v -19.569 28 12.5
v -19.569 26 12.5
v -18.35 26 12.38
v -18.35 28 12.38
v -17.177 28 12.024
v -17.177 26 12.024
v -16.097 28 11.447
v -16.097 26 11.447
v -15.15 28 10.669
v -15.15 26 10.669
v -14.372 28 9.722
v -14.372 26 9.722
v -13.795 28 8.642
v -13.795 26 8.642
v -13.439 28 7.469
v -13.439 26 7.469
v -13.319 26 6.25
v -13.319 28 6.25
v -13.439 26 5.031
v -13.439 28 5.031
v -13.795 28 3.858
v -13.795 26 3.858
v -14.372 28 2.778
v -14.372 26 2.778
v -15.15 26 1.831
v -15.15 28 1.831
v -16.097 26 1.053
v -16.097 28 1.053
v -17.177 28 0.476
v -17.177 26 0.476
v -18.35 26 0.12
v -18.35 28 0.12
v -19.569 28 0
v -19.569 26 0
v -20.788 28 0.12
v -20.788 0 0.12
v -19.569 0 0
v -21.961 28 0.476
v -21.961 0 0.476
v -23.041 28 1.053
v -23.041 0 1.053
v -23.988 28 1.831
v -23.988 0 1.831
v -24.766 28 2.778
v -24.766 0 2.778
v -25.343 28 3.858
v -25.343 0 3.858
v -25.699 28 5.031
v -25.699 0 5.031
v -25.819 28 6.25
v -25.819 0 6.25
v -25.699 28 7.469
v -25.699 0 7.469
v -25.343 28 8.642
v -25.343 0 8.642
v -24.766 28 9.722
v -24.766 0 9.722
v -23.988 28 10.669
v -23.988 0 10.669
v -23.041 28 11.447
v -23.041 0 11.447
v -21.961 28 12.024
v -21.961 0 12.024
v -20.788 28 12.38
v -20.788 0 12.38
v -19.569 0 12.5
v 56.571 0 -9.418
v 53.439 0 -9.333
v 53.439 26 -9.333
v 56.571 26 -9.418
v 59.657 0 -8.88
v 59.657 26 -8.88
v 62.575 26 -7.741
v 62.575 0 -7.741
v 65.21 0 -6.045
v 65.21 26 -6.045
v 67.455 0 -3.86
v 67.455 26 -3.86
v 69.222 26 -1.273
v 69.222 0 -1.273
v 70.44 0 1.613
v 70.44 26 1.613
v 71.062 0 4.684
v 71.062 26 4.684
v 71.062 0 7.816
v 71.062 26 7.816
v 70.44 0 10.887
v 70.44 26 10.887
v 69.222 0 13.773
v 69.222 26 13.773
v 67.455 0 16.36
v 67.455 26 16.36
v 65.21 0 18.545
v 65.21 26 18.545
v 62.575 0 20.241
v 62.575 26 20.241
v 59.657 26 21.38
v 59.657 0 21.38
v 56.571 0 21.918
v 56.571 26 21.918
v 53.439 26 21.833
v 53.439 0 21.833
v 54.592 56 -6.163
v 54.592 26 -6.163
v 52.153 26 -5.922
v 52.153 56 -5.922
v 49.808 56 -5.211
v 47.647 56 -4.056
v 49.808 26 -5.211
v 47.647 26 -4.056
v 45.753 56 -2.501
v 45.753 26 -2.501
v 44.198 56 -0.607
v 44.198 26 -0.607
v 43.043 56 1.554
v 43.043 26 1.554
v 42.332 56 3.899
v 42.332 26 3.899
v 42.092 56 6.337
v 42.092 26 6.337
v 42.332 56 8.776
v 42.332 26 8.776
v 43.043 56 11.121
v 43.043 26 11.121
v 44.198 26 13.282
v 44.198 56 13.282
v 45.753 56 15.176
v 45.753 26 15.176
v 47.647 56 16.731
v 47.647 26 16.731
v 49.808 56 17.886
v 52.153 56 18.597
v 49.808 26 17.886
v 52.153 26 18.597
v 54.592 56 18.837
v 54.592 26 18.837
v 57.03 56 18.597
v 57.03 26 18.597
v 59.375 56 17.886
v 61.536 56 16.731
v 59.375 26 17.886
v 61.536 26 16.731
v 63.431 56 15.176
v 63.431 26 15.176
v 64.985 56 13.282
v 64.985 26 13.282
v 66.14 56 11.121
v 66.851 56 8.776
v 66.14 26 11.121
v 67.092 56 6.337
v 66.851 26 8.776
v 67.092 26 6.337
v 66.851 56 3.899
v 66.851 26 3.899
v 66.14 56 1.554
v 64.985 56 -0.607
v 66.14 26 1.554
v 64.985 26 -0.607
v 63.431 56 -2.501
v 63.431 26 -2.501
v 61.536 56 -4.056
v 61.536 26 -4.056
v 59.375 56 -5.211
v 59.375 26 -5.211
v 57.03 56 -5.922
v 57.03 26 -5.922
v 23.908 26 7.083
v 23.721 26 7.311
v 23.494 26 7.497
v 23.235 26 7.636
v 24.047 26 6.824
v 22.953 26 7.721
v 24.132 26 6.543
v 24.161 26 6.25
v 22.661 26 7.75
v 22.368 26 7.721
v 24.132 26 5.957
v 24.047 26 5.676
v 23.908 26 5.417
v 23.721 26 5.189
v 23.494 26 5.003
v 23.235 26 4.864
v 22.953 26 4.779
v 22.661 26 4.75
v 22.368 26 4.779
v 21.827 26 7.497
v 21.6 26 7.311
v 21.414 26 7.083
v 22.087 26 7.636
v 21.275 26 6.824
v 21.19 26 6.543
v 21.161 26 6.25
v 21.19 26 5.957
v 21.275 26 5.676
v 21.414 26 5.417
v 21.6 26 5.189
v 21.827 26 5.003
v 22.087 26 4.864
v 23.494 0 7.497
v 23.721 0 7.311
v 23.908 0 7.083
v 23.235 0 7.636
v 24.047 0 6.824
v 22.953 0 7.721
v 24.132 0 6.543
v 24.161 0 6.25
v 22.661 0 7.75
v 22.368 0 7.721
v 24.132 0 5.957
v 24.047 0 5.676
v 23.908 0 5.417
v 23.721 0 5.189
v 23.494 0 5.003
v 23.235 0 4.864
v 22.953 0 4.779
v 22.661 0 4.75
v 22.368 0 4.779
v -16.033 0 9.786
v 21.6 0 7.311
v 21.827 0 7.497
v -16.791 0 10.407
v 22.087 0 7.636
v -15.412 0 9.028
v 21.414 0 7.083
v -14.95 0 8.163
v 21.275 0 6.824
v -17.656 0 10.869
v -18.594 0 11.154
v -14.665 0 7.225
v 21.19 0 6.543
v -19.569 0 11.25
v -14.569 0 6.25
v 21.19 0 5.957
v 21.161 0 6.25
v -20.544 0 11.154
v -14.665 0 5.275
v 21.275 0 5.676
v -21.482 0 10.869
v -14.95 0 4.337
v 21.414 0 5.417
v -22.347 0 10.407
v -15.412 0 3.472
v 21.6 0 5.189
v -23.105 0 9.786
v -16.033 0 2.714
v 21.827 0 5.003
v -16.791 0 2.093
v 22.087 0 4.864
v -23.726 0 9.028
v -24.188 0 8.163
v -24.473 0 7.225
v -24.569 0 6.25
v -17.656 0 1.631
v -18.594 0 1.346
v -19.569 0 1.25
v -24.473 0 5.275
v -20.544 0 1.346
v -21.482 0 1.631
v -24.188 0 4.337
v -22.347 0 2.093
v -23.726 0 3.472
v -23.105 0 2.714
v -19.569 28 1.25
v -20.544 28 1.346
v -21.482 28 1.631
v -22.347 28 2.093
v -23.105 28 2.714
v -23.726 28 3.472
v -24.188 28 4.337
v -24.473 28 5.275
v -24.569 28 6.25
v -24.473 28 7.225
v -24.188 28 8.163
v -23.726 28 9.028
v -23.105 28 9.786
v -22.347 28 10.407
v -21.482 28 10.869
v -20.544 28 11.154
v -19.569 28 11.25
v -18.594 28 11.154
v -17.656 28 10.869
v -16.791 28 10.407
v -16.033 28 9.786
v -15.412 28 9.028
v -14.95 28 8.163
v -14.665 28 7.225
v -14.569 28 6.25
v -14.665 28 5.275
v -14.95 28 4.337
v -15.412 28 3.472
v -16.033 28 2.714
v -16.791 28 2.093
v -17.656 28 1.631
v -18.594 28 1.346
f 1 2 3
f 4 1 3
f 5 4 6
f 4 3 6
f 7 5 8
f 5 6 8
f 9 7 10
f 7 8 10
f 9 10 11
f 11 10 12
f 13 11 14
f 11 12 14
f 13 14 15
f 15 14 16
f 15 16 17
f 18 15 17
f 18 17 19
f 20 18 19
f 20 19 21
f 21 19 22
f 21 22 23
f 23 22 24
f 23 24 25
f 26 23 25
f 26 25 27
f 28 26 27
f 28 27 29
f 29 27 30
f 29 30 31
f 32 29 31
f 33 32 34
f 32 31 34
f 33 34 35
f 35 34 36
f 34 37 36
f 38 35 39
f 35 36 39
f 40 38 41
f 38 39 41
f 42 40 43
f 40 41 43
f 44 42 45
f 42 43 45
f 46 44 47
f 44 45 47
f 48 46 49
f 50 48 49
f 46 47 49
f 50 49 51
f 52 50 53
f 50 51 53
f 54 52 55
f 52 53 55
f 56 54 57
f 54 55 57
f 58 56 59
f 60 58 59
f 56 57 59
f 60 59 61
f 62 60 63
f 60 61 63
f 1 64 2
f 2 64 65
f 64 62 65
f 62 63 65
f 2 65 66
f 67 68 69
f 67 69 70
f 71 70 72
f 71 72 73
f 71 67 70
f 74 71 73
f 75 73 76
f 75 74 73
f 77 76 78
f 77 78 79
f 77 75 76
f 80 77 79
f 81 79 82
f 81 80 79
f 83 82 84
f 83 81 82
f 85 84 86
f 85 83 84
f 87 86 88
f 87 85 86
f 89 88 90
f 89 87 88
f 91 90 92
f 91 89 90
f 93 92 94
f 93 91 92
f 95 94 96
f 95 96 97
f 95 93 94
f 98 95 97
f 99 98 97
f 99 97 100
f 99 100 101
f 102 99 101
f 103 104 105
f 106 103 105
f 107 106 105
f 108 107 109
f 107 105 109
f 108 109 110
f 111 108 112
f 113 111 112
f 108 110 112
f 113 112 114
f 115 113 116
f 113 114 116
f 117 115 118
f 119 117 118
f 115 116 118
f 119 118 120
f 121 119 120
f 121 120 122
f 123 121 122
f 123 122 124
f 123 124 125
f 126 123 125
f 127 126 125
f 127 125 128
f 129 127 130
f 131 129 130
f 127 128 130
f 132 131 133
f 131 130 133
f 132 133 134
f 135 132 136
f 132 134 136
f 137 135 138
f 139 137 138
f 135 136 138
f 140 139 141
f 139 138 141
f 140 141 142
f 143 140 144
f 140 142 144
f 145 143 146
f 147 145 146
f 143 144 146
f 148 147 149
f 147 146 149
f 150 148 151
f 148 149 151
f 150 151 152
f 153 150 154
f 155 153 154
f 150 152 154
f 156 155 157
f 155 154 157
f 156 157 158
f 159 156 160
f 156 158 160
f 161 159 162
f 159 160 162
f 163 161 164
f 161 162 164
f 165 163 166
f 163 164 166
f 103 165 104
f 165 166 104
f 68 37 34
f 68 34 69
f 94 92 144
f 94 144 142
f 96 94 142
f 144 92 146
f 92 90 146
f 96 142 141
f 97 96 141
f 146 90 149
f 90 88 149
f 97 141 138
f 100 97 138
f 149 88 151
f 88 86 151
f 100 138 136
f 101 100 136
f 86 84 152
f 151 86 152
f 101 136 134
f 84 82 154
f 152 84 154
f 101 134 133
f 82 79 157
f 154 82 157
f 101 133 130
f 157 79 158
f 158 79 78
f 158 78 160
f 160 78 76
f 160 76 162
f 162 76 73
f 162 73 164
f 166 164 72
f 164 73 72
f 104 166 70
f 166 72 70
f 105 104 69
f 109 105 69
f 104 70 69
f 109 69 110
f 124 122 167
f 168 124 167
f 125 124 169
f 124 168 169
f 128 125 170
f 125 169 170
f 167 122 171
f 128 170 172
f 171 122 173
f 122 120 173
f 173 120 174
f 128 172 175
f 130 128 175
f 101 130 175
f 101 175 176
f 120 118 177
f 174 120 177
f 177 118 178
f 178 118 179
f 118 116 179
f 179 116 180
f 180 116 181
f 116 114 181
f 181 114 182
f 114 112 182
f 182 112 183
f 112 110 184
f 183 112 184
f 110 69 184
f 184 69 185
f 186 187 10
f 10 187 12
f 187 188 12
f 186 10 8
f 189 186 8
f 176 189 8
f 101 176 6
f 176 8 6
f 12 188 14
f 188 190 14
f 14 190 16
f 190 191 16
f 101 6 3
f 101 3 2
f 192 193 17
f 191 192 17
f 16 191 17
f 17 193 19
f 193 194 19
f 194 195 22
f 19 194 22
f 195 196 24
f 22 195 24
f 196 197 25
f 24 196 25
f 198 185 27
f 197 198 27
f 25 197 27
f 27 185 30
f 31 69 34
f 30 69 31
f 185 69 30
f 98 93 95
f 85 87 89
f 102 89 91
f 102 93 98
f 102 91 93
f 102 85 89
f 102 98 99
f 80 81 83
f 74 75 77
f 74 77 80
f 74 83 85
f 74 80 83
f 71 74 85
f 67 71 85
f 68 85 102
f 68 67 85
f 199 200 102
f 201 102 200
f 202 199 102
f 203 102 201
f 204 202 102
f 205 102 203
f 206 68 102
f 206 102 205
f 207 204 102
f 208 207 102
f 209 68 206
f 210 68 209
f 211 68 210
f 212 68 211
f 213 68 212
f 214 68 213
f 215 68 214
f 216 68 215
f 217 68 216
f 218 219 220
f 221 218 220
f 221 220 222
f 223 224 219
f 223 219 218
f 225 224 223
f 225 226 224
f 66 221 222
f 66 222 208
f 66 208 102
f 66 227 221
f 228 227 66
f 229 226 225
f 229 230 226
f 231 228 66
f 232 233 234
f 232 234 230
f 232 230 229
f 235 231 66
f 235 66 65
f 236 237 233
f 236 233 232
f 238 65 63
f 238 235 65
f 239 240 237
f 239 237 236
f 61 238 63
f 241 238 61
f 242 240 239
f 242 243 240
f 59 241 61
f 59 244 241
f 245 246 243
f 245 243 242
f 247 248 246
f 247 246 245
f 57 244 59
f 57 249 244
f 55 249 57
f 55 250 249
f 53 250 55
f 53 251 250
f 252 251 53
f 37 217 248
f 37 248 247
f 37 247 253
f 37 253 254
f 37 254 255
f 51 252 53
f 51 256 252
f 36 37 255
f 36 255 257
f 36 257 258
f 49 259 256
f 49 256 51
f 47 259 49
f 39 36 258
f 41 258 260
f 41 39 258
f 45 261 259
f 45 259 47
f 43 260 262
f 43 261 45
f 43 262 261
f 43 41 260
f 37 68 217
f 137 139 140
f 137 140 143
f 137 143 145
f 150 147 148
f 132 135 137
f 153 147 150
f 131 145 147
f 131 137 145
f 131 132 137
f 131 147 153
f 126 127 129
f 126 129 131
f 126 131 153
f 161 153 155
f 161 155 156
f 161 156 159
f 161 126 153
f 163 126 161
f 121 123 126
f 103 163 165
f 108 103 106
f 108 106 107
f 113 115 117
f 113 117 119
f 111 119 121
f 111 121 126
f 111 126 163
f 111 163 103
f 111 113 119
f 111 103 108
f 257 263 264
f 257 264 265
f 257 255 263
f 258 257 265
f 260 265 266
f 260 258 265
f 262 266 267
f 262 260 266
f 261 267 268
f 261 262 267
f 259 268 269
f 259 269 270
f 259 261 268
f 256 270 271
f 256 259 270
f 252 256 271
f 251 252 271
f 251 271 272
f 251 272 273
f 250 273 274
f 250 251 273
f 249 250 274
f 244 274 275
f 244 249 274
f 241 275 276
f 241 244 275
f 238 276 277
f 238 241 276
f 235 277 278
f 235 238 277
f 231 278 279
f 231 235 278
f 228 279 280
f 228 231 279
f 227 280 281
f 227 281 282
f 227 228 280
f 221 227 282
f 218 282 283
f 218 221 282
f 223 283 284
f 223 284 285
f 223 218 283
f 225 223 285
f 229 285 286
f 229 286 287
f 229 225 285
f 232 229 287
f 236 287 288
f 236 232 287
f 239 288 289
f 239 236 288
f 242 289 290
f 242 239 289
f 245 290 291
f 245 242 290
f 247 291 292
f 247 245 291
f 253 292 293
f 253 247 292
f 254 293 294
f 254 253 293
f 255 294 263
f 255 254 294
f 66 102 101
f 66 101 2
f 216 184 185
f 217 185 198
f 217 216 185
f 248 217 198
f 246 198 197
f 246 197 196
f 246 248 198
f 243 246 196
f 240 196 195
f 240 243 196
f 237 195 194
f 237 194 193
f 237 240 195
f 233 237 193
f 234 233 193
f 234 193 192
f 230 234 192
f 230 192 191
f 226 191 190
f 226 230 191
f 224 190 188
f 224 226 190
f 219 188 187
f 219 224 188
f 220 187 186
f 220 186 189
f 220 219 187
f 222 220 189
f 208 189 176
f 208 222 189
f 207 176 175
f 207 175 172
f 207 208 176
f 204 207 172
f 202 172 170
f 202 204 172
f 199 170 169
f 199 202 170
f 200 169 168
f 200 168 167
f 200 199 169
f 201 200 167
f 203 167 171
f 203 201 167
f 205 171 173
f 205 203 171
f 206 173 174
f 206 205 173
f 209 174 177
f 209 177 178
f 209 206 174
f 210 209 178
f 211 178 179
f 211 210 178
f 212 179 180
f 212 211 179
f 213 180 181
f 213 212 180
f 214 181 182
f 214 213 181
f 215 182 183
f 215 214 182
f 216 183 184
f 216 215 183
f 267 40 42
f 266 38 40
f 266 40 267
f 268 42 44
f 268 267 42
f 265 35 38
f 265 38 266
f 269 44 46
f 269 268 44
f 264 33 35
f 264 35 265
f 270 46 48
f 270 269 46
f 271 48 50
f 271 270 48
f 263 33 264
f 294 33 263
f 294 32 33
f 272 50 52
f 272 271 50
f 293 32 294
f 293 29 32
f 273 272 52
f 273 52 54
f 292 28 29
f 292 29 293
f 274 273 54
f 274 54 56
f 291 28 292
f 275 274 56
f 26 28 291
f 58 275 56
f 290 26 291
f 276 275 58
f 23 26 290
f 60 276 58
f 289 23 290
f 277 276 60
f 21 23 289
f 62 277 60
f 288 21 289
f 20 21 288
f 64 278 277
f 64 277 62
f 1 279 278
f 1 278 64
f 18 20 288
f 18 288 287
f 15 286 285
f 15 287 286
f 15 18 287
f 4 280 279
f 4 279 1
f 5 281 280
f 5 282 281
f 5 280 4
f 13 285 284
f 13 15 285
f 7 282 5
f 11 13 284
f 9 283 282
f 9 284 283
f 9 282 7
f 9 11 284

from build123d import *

# Parameters (mm, degrees)
SKETCH1_R           = 5
SKETCH1_R_2         = 1.5
BOSS_EXTRUDE2_DEPTH = 26
SKETCH2_R           = 6.25
BOSS_EXTRUDE3_DEPTH = 2
CUT_EXTRUDE1_START  = -2
SKETCH3_R           = 5
CUT_EXTRUDE1_DEPTH  = 2
SKETCH5_R           = 12.5
BOSS_EXTRUDE4_DEPTH = 30


with BuildPart() as part:
    # Sketch1 → Boss-Extrude2 (new body)
    with BuildSketch(Plane(origin=(0, 0, 0), x_dir=(1, 0, 0), z_dir=(0, 1, 0))):
        with BuildLine():
            Line((-19.568980619, 0), (53.439105934, 9.332584612))
            ThreePointArc((53.439105934, 9.332584612), (71.14040073, -6.25), (53.439105934, -21.832584612))
            Line((53.439105934, -21.832584612), (-19.568980619, -12.5))
            ThreePointArc((-19.568980619, -12.5), (-25.818980619, -6.25), (-19.568980619, 0))
        make_face()
        with Locations(Location((-19.568980619, -6.25, 0), (0, 0, 90))):
            Circle(SKETCH1_R, mode=Mode.SUBTRACT)
        with Locations(Location((22.660710056, -6.25, 0), (0, 0, 90))):
            Circle(SKETCH1_R_2, mode=Mode.SUBTRACT)
    extrude(amount=BOSS_EXTRUDE2_DEPTH)

    # Sketch2 → Boss-Extrude3 (add)
    with BuildSketch(Plane(origin=(0, 26, 0), x_dir=(1, 0, 0), z_dir=(0, 1, 0))):
        with Locations(Location((-19.568980619, -6.25, 0), (0, 0, 270))):
            Circle(SKETCH2_R)
    extrude(amount=BOSS_EXTRUDE3_DEPTH)

    # Sketch3 → Cut-Extrude1 (cut)
    with BuildSketch(Plane(origin=(0, 28, 0), x_dir=(1, 0, 0), z_dir=(0, 1, 0)).offset(CUT_EXTRUDE1_START)):
        with Locations(Location((-19.568980619, -6.25, 0), (0, 0, 90))):
            Circle(SKETCH3_R)
    extrude(amount=CUT_EXTRUDE1_DEPTH, mode=Mode.SUBTRACT)

    # Sketch5 → Boss-Extrude4 (add)
    with BuildSketch(Plane(origin=(0, 26, 0), x_dir=(1, 0, 0), z_dir=(0, 1, 0))):
        with Locations(Location((54.591675649, -6.337344707, 0), (0, 0, 90))):
            Circle(SKETCH5_R)
    extrude(amount=BOSS_EXTRUDE4_DEPTH)


solid = part.part
